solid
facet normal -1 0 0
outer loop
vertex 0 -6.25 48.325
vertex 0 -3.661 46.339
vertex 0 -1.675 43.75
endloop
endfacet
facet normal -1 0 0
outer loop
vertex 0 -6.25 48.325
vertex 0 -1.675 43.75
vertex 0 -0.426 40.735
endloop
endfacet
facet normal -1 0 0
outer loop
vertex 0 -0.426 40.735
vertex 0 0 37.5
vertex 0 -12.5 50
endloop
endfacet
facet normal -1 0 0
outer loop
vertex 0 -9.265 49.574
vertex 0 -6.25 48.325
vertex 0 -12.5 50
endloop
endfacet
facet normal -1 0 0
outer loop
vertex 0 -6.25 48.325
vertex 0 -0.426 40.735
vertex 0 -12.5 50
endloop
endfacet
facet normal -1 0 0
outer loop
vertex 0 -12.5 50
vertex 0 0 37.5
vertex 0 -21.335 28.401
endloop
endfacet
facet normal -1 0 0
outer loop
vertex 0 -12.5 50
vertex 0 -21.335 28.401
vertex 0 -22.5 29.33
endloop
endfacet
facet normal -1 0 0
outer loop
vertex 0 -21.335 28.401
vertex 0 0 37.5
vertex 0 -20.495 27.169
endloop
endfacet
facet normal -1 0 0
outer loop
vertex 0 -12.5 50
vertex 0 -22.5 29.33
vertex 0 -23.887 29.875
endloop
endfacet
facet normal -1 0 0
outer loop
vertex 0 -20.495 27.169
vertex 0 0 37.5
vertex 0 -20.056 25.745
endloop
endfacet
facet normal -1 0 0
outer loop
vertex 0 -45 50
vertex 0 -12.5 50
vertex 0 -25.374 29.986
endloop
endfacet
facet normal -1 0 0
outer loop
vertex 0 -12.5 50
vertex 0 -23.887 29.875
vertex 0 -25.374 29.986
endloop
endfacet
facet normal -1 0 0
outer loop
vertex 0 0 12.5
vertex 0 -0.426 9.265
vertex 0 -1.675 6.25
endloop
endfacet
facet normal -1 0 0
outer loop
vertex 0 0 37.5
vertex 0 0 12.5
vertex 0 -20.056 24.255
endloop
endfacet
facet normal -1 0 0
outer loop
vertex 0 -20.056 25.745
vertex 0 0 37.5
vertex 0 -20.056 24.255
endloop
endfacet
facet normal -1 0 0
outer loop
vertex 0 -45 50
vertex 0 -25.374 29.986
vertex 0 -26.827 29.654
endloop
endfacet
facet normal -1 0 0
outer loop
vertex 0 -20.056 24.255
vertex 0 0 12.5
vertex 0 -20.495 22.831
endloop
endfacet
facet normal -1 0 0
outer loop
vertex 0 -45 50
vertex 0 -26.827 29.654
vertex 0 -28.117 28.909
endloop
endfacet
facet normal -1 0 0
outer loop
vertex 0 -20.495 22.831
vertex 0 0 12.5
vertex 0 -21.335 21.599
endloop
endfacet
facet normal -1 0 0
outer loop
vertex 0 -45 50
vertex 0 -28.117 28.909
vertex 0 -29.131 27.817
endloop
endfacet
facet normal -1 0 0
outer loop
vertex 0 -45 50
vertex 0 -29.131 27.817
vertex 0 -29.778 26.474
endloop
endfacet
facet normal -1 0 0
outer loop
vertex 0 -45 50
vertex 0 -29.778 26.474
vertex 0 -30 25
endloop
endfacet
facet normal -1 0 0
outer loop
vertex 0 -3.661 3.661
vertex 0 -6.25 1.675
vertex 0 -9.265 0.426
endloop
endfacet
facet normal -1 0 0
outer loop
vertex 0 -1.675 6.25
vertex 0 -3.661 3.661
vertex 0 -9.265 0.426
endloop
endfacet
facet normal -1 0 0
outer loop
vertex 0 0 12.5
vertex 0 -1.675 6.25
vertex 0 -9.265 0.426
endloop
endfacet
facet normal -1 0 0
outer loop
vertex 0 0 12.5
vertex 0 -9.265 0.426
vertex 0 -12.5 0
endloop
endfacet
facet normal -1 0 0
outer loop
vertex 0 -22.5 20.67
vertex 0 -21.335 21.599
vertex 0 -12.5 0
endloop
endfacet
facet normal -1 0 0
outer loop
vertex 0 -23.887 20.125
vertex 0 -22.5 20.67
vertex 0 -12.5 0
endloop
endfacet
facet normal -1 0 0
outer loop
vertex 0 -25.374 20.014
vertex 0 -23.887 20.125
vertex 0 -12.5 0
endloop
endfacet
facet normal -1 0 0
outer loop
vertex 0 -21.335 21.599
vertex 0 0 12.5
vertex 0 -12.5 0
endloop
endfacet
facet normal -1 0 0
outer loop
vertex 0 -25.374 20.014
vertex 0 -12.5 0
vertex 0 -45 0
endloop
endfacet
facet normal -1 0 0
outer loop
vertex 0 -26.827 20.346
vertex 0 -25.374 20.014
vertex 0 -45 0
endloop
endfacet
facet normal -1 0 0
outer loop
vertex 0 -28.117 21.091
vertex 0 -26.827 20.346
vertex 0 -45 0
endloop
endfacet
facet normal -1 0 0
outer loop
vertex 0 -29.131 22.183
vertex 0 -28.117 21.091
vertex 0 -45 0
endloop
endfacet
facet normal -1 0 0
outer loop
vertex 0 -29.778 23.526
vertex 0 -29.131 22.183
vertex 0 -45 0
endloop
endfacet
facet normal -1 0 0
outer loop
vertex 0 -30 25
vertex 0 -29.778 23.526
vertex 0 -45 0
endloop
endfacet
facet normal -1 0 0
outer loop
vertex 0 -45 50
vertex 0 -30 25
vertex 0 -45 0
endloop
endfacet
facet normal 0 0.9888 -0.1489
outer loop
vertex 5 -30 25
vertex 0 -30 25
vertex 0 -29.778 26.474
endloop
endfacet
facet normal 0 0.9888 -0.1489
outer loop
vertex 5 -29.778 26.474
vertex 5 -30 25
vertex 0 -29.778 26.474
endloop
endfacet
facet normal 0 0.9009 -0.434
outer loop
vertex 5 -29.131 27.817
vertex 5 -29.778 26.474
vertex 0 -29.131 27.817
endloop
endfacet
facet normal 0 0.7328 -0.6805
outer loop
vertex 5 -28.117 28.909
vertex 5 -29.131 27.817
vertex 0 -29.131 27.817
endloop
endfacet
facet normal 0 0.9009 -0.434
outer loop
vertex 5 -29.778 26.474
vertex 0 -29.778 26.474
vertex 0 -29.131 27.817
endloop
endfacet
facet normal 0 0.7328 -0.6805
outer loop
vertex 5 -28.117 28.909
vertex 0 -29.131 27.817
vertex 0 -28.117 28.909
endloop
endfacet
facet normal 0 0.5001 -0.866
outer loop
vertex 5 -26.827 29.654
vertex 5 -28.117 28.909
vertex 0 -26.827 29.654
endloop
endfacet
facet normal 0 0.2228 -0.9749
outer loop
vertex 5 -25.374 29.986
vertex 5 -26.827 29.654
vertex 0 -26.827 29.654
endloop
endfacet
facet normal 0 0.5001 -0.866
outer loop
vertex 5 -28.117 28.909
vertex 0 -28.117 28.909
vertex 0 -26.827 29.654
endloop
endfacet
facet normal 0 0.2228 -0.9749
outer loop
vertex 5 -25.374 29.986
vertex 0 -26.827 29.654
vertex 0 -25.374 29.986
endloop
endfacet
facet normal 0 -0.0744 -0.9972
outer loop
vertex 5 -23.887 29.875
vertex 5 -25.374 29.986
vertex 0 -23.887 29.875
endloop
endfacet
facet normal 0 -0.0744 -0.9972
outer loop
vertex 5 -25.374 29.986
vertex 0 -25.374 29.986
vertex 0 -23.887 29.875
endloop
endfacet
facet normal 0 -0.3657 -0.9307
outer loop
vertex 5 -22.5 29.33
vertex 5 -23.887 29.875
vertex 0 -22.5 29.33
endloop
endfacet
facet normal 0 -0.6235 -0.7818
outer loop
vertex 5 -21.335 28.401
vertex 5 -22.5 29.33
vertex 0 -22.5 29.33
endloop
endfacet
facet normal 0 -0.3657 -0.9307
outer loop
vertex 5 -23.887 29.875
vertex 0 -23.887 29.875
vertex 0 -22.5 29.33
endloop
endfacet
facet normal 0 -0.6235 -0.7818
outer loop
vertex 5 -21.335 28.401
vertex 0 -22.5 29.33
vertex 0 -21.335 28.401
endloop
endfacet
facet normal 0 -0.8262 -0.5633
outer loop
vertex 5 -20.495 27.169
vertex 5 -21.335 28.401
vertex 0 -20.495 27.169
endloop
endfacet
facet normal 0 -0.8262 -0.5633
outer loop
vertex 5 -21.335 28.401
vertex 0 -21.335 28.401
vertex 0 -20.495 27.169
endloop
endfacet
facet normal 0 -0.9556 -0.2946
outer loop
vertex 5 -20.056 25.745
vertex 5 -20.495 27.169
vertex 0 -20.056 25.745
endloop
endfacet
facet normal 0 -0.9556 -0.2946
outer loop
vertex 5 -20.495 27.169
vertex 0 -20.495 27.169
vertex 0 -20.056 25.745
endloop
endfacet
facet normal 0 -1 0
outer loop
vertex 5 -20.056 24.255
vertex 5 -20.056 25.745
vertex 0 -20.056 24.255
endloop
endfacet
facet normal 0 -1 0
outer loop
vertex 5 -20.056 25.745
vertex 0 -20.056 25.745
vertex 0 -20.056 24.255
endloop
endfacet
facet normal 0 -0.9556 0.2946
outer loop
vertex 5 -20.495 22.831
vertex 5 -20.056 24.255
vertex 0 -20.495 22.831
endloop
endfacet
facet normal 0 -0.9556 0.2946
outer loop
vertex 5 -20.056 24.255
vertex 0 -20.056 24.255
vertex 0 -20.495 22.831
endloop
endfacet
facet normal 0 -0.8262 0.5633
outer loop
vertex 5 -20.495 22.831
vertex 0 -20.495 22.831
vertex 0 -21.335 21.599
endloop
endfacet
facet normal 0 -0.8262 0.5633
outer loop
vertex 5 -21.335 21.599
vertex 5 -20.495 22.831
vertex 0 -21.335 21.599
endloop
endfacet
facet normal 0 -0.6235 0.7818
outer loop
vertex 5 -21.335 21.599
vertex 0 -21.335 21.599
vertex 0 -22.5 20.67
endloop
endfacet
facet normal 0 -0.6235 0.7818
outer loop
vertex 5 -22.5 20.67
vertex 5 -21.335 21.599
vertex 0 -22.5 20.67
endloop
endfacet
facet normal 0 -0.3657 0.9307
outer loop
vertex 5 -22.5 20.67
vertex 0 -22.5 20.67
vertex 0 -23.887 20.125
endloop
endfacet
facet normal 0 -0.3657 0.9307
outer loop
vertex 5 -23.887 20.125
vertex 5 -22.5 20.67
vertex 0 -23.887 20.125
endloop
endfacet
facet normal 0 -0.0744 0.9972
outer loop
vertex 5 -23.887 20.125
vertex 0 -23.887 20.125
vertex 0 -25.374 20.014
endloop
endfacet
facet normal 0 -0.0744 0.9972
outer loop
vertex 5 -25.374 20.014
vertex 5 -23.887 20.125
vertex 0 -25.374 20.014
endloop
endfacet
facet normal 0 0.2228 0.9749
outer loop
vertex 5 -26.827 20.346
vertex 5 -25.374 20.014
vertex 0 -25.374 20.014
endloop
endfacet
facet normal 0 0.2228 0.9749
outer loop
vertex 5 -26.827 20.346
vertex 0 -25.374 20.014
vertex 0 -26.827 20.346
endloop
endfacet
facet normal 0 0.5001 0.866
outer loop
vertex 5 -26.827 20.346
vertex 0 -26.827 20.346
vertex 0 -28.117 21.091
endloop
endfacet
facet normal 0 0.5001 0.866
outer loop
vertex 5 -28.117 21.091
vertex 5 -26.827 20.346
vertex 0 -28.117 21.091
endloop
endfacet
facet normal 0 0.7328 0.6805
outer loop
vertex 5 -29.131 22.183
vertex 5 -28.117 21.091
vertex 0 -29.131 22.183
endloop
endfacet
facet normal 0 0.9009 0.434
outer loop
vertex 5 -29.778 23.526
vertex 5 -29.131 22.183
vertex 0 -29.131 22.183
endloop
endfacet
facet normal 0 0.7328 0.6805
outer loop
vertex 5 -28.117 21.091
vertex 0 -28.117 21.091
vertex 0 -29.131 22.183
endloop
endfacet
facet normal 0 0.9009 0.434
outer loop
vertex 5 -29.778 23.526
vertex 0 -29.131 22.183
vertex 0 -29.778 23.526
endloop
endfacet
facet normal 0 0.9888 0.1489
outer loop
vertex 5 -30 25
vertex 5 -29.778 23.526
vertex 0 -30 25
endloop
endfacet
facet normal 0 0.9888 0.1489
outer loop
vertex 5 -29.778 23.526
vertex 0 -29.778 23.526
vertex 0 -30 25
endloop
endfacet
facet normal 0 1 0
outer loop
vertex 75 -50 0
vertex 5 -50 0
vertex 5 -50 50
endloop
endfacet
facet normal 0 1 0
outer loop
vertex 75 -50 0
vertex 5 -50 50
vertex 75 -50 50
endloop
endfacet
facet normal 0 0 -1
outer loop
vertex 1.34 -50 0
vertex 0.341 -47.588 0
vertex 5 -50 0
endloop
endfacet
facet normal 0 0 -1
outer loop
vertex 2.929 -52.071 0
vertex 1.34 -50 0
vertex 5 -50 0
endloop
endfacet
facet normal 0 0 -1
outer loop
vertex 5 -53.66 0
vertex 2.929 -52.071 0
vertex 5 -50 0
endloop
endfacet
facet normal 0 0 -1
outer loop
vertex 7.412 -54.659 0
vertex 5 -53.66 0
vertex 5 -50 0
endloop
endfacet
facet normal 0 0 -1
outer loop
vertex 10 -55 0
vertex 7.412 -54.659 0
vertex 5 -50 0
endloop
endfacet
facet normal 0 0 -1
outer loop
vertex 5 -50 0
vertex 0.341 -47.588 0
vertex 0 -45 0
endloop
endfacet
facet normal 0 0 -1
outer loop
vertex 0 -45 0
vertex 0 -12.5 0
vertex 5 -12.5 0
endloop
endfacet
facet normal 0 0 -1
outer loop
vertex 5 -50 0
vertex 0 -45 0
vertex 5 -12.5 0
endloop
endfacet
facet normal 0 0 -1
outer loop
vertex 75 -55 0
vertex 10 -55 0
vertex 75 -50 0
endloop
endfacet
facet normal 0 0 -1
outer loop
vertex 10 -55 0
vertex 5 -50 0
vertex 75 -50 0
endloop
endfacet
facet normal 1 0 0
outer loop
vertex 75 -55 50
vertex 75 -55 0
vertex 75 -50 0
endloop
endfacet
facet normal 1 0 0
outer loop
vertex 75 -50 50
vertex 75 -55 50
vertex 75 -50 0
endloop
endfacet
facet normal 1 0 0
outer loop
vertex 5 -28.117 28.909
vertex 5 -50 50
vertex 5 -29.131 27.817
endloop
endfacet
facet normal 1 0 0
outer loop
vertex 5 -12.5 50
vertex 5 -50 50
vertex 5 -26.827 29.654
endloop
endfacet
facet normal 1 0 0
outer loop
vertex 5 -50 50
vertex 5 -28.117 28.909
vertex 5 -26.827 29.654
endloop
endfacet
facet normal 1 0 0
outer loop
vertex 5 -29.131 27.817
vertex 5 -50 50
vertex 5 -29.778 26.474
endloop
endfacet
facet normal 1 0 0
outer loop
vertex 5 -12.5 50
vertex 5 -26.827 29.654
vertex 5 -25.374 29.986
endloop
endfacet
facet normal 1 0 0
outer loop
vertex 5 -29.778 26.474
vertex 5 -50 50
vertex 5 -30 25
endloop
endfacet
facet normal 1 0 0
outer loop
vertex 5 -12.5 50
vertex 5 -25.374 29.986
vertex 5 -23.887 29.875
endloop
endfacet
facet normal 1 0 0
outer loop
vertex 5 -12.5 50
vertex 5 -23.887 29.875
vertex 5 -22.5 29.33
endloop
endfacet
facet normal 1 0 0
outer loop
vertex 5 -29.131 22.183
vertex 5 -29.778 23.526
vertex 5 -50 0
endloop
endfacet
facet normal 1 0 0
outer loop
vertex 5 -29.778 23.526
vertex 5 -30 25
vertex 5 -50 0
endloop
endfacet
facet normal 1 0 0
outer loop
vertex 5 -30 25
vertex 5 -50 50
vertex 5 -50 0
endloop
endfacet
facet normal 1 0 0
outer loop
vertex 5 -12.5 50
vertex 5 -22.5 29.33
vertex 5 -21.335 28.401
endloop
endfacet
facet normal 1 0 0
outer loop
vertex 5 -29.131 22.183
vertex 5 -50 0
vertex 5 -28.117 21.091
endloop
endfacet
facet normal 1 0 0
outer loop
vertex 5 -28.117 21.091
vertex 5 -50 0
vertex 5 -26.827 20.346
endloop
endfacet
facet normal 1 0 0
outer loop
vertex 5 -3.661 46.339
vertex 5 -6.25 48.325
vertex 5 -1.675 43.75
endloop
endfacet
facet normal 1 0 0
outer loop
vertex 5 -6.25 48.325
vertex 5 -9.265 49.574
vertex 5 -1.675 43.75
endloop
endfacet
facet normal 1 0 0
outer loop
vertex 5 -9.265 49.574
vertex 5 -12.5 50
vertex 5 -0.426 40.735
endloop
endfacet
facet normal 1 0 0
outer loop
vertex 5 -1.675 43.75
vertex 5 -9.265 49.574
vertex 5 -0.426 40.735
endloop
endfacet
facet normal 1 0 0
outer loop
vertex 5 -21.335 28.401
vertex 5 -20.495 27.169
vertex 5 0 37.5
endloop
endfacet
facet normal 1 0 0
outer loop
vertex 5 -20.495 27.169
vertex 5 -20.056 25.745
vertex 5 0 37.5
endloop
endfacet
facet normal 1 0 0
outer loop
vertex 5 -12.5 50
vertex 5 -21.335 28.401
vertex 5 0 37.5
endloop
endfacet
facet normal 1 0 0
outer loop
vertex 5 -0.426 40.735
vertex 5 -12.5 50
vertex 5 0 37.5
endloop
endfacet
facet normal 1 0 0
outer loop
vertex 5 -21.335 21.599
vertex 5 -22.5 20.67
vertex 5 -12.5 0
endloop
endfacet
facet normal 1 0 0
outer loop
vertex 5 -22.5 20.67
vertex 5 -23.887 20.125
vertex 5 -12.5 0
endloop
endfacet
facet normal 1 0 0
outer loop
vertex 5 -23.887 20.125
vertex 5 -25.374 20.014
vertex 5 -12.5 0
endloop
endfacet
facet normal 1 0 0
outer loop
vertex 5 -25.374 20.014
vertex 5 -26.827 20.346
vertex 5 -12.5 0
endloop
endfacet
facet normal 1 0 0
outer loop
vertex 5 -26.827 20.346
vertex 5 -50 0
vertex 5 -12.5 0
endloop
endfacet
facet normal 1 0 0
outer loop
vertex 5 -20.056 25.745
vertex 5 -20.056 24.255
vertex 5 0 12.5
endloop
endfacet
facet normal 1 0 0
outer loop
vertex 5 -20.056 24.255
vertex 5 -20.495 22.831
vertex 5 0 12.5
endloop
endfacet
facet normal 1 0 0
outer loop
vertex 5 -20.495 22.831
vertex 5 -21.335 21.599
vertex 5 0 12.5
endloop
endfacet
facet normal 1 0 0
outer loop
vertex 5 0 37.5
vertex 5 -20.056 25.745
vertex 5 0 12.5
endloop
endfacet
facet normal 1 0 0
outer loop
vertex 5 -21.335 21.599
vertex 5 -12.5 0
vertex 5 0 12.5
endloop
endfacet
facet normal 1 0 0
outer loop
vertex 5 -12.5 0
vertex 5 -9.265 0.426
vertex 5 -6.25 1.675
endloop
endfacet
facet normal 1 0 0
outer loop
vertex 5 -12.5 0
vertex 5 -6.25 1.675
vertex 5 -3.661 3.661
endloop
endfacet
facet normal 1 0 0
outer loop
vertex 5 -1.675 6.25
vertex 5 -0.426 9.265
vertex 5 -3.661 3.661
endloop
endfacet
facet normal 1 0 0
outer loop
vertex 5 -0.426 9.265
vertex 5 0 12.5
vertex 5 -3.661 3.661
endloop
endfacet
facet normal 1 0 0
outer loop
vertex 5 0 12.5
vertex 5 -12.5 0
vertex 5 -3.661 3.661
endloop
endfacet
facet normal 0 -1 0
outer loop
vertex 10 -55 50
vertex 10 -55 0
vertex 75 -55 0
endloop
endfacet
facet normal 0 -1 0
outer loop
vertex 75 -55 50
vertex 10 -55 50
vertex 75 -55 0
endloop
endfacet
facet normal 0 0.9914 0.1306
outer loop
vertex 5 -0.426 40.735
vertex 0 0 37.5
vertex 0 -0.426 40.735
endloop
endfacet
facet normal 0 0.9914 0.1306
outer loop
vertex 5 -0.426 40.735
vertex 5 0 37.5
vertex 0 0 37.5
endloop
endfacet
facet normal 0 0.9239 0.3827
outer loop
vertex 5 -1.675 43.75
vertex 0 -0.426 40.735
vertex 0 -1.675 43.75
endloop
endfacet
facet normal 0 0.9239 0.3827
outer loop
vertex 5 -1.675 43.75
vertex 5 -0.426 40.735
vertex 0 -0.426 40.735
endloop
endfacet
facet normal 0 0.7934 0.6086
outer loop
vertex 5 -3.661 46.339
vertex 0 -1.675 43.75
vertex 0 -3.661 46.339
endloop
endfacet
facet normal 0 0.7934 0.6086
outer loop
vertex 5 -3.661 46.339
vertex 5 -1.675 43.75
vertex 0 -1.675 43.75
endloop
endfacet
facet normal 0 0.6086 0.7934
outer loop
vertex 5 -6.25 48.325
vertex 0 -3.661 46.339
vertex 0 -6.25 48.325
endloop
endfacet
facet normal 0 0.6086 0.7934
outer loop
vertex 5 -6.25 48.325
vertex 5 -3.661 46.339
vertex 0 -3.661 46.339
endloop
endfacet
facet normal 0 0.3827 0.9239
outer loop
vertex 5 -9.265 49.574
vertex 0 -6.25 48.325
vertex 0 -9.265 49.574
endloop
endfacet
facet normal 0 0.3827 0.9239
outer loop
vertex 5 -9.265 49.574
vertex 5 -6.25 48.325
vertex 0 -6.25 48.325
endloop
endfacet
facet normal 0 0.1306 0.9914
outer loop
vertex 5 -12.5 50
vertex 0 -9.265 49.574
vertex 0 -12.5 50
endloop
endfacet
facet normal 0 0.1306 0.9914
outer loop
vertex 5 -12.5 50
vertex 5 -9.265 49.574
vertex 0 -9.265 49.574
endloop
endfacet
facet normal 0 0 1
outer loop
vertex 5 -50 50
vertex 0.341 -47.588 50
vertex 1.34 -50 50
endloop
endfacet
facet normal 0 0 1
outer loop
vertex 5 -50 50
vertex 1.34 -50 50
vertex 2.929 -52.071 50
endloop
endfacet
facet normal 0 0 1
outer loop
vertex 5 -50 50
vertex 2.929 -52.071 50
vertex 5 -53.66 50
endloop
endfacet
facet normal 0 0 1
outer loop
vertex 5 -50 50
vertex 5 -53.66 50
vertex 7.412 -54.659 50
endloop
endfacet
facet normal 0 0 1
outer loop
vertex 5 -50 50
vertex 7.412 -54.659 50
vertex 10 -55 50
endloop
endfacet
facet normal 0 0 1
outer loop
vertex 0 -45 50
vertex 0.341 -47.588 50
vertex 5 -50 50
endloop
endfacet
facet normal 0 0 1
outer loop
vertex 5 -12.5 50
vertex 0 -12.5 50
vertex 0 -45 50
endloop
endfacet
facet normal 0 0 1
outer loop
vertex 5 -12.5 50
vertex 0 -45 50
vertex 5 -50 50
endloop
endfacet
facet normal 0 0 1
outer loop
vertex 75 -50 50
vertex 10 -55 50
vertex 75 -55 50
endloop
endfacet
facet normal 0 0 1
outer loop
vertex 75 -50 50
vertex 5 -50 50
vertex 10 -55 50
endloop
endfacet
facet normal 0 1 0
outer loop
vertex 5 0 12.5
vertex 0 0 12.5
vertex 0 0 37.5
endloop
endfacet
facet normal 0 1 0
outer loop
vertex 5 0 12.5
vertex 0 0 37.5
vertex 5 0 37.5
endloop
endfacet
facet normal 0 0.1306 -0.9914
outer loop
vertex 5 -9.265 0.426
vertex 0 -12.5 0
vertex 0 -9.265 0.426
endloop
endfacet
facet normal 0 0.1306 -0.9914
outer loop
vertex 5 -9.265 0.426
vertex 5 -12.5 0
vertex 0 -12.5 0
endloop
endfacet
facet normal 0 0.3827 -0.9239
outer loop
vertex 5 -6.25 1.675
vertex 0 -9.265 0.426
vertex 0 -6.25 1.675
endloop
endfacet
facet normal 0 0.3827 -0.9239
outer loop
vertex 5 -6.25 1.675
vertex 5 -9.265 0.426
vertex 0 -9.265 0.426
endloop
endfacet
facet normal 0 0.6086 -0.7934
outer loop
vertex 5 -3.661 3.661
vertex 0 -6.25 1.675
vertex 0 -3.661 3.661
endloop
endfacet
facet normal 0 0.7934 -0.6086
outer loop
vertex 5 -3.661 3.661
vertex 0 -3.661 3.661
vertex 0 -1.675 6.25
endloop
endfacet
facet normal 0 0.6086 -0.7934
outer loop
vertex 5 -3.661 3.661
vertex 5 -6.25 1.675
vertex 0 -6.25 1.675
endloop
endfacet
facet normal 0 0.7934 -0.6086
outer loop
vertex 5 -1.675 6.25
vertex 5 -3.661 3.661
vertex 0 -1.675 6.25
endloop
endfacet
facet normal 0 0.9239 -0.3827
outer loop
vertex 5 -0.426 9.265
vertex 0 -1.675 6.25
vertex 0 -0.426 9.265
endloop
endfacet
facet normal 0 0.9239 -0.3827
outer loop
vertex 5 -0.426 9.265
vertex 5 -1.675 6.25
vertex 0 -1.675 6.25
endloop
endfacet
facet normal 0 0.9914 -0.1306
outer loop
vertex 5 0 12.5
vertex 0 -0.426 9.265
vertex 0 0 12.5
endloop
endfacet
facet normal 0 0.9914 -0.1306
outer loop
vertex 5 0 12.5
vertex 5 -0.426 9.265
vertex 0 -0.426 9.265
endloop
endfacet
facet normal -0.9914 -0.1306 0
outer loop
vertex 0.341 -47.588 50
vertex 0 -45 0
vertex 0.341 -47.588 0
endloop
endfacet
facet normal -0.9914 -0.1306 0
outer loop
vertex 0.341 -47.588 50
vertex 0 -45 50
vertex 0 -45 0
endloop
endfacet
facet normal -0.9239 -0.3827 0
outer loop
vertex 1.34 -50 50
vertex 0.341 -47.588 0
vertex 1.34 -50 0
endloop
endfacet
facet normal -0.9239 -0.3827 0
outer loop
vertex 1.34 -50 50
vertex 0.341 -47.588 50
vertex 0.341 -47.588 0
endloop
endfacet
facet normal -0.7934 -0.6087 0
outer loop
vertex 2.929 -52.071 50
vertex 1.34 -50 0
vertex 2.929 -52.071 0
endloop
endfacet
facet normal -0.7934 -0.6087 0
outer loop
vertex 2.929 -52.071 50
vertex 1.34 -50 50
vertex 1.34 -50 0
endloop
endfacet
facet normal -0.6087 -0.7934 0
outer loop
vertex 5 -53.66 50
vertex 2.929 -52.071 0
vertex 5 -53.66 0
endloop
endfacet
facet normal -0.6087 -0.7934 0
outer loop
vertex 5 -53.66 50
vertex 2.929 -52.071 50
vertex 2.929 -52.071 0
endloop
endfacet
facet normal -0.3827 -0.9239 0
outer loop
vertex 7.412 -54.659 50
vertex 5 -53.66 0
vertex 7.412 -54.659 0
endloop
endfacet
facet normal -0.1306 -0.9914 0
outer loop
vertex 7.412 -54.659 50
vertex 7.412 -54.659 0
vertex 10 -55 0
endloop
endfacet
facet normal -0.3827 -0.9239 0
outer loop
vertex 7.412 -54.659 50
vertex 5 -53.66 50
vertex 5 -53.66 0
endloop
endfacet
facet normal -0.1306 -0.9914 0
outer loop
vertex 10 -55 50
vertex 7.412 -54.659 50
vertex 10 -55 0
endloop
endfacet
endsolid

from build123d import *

# Parameters (mm, degrees)
SKETCH1_W           = 5
SKETCH1_H           = 50
SKETCH1_W_2         = 70
SKETCH1_H_2         = 5
BOSS_EXTRUDE1_DEPTH = 50
SKETCH2_R           = 5
CUT_EXTRUDE1_DEPTH  = 5
FILLET1_R           = 10
FILLET2_R           = 12.5


with BuildPart() as part:
    # Sketch1 → Boss-Extrude1 (new body)
    with BuildSketch(Plane.XY):
        with Locations((2.5, -25)):
            Rectangle(SKETCH1_W, SKETCH1_H)
        with Locations((40, -52.5)):
            Rectangle(SKETCH1_W_2, SKETCH1_H_2)
        with Locations((2.5, -52.5)):
            Rectangle(SKETCH1_W, SKETCH1_H_2)
    extrude(amount=BOSS_EXTRUDE1_DEPTH)

    # Sketch2 → Cut-Extrude1 (cut)
    with BuildSketch(Plane.ZY):
        with Locations(Location((25, -25, 0), (0, 0, 270))):
            Circle(SKETCH2_R)
    extrude(amount=-CUT_EXTRUDE1_DEPTH, mode=Mode.SUBTRACT)

    # Fillet1
    fillet1_edges = [part.edges().sort_by_distance(p)[0] for p in [
        (0, -55, 25),
    ]]
    fillet(fillet1_edges, radius=FILLET1_R)

    # Fillet2
    fillet2_edges = [part.edges().sort_by_distance(p)[0] for p in [
        (2.5, 0, 50),
        (2.5, 0, 0),
    ]]
    fillet(fillet2_edges, radius=FILLET2_R)


solid = part.part
